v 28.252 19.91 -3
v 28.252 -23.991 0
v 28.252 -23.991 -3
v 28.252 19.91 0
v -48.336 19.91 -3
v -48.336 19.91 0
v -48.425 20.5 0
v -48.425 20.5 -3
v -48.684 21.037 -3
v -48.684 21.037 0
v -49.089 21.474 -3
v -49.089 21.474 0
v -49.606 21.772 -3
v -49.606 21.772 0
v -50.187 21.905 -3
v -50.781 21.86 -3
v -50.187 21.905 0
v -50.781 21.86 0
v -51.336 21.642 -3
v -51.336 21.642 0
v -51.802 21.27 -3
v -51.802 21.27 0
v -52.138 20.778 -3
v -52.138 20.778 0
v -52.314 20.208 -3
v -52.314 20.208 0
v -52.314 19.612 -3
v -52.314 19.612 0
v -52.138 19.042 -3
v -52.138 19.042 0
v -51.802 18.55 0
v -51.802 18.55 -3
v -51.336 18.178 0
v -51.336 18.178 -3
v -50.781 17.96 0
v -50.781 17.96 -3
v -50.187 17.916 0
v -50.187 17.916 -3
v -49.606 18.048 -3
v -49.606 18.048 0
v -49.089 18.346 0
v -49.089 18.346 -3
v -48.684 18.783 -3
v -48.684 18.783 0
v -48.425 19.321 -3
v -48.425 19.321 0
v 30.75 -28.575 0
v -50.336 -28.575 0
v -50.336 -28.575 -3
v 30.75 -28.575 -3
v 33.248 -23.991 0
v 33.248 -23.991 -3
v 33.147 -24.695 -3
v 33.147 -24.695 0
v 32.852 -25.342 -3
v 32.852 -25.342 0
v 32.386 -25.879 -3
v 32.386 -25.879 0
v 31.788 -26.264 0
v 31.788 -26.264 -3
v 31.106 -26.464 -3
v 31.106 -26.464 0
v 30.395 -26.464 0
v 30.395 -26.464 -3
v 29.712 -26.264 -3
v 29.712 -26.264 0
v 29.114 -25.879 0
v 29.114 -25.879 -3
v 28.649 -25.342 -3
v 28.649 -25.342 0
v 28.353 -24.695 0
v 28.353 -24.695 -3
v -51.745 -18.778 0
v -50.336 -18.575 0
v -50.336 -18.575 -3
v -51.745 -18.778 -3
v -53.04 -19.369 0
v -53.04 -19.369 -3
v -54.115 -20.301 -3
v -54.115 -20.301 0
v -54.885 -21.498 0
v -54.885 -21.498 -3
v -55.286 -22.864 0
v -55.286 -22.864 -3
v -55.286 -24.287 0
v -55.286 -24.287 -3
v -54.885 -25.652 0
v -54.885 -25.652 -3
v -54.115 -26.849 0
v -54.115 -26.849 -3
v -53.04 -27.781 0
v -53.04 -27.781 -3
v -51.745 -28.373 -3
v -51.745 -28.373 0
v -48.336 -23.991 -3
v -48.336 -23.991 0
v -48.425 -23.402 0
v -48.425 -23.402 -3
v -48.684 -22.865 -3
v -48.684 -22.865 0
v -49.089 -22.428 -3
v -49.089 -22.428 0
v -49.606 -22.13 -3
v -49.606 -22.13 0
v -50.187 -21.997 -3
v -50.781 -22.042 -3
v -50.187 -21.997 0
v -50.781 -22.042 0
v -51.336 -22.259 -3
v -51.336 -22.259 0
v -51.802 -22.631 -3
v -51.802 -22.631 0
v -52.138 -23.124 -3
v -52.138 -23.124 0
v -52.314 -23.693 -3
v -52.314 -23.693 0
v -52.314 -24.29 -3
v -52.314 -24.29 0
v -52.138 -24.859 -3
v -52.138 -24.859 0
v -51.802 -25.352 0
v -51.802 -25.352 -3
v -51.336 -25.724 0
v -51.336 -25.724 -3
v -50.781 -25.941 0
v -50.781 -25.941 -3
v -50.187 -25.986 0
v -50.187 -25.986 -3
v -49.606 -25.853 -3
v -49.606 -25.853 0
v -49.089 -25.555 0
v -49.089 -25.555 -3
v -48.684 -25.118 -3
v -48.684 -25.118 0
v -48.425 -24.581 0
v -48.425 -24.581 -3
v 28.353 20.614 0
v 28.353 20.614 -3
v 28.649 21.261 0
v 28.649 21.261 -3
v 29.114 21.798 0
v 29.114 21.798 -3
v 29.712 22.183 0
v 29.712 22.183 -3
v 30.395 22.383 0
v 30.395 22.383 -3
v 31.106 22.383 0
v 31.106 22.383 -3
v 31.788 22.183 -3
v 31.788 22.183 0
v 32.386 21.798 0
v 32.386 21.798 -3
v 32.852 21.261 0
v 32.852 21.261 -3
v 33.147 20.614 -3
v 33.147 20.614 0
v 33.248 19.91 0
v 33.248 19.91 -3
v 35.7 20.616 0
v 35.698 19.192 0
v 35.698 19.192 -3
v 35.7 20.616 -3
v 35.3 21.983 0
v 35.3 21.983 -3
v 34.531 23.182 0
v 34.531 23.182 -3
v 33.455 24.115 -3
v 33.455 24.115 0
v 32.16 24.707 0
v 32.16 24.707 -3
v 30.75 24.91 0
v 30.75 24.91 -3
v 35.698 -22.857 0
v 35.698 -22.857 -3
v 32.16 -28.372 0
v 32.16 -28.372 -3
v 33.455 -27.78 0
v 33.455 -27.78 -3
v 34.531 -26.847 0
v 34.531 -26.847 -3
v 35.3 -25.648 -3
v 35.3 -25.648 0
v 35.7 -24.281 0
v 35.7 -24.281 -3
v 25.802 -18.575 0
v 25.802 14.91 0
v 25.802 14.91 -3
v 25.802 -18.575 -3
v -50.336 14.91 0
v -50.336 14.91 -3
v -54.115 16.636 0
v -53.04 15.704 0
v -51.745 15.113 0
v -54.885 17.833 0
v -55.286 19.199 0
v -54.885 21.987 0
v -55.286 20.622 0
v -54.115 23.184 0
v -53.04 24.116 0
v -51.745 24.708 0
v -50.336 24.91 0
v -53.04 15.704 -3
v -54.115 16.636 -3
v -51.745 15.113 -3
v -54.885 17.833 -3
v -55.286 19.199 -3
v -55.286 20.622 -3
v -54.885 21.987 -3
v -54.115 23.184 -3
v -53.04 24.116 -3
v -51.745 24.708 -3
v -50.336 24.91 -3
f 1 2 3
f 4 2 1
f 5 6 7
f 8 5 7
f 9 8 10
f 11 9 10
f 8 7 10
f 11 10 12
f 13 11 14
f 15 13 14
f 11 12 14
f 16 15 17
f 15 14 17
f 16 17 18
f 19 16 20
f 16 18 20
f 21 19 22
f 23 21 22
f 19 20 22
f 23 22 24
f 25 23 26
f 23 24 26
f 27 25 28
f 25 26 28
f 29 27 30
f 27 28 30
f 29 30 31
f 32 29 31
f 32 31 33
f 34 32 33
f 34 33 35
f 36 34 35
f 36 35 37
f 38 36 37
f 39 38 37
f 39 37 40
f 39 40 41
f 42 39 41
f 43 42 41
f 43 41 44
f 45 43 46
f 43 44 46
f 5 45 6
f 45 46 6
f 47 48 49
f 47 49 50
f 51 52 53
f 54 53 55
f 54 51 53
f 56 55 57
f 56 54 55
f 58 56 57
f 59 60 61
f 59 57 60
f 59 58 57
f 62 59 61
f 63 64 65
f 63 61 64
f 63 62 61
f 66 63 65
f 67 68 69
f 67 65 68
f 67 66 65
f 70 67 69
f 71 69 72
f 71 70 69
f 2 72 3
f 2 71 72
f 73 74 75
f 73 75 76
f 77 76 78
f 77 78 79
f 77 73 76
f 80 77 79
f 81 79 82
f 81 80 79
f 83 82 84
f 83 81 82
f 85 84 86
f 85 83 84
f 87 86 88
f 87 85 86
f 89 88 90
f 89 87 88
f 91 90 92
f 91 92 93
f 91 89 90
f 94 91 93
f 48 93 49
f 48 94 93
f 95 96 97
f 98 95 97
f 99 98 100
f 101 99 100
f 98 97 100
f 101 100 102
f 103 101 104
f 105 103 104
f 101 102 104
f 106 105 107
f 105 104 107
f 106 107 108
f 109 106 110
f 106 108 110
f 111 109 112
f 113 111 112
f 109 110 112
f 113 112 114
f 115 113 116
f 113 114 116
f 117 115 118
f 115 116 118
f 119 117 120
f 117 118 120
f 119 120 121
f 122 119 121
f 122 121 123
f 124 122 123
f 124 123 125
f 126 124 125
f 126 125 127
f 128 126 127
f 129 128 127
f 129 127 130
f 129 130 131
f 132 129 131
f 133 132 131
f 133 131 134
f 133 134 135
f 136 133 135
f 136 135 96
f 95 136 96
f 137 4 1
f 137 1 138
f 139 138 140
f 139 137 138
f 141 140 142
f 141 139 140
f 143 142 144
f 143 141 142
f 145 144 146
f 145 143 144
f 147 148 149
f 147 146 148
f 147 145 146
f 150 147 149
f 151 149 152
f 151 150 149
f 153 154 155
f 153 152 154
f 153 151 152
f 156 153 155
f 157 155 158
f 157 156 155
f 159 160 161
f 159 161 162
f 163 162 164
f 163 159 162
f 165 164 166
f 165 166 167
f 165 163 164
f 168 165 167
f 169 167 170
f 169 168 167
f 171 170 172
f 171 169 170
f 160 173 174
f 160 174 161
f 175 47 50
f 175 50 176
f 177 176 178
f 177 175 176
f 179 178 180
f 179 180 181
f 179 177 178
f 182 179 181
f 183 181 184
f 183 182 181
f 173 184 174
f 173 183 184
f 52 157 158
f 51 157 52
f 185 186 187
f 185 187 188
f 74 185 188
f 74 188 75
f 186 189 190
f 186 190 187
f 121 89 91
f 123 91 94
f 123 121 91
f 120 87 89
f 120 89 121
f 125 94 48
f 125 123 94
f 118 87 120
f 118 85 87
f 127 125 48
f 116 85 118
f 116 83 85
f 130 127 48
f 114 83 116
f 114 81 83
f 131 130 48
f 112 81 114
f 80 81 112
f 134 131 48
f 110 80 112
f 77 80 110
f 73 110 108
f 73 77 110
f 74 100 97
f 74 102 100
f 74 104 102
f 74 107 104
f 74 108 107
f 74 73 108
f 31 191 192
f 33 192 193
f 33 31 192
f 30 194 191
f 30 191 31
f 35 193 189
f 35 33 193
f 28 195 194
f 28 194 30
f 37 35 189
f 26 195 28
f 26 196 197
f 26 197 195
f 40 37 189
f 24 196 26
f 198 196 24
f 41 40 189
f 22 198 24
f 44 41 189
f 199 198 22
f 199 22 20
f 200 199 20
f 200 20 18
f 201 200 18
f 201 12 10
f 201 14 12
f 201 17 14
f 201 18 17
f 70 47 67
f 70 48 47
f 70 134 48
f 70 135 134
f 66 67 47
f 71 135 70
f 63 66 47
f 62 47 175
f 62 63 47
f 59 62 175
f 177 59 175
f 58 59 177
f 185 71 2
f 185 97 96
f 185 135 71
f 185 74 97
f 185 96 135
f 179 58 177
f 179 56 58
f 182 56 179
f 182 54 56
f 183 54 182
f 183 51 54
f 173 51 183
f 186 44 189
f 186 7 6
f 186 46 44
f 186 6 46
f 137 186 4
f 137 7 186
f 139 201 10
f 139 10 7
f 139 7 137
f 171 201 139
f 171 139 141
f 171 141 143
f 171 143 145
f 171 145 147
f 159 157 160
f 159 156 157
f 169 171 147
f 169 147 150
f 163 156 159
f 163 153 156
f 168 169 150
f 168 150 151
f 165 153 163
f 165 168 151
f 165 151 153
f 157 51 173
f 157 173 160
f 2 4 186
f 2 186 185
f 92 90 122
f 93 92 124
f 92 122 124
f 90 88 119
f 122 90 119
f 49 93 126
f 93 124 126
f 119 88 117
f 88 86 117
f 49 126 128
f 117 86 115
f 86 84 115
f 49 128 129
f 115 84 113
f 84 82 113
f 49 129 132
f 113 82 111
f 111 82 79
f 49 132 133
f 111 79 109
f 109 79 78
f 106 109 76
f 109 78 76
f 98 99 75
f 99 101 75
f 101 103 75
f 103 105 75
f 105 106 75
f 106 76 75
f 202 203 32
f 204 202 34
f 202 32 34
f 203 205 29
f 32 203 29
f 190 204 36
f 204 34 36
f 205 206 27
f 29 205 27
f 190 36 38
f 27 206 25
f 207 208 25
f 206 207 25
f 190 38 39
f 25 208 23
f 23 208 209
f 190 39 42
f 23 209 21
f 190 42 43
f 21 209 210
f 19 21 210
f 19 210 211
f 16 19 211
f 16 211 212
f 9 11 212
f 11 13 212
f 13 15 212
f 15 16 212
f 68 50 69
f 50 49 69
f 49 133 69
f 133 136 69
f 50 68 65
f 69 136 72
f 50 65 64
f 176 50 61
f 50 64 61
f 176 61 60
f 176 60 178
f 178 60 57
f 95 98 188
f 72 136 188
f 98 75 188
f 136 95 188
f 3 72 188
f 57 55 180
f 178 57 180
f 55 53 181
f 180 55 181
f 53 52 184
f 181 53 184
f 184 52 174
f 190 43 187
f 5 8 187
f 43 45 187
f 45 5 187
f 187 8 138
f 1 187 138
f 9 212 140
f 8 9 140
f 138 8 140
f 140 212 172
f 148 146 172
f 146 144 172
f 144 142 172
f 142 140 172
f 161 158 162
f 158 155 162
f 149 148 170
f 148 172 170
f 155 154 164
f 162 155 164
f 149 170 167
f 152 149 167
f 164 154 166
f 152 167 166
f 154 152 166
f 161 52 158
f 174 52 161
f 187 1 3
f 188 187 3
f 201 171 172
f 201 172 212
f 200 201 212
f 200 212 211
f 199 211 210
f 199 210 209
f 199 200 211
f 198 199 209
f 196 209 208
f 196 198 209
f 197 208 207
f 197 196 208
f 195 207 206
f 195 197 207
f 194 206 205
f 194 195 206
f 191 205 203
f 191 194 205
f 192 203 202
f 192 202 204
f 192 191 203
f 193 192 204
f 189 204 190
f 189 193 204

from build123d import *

# Parameters (mm, degrees)
SKETCH_1_R          = 2
EXTRUDE_1_DEPTH     = 3
SKETCH_6_R          = 2
CUT_EXTRUDE_1_DEPTH = 6
CUT_EXTRUDE_2_DEPTH = 6


with BuildPart() as part:
    # 草图1 → 凸台-拉伸1 (new body)
    with BuildSketch(Plane.XY):
        with BuildLine():
            Line((30.750249224, 24.910133645), (-50.336395226, 24.910133645))
            ThreePointArc((-50.336395226, 24.910133645), (-55.336395226, 19.910133645), (-50.336395226, 14.910133645))
            Line((-50.336395226, 14.910133645), (25.802071198, 14.910133645))
            Line((25.802071198, 14.910133645), (25.802071198, -18.575080464))
            Line((25.802071198, -18.575080464), (-50.336395226, -18.575080464))
            ThreePointArc((-50.336395226, -18.575080464), (-55.336395226, -23.575080464), (-50.336395226, -28.575080464))
            Line((-50.336395226, -28.575080464), (30.750249224, -28.575080464))
            ThreePointArc((30.750249224, -28.575080464), (34.531124493, -26.846927374), (35.69842725, -22.857073344))
            Line((35.69842725, -22.857073344), (35.69842725, 19.192126526))
            ThreePointArc((35.69842725, 19.192126526), (34.531124493, 23.181980555), (30.750249224, 24.910133645))
        make_face()
        with Locations((-50.336395226, 19.910133645)):
            Circle(SKETCH_1_R, mode=Mode.SUBTRACT)
    extrude(amount=-EXTRUDE_1_DEPTH)

    # 草图6 → 切除-拉伸1 (cut)
    with BuildSketch(Plane.XY):
        with Locations((-50.336395226, -23.991463112)):
            Circle(SKETCH_6_R)
    extrude(amount=-CUT_EXTRUDE_1_DEPTH, mode=Mode.SUBTRACT)

    # 草图13 → 切除-拉伸2 (cut)
    with BuildSketch(Plane.XY):
        with BuildLine():
            Line((33.24842725, 19.910133645), (33.24842725, -23.991463112))
            ThreePointArc((33.24842725, -23.991463112), (30.750249224, -26.489641138), (28.252071198, -23.991463112))
            Line((28.252071198, -23.991463112), (28.252071198, 19.910133645))
            ThreePointArc((28.252071198, 19.910133645), (30.750249224, 22.408311671), (33.24842725, 19.910133645))
        make_face()
    extrude(amount=-CUT_EXTRUDE_2_DEPTH, mode=Mode.SUBTRACT)


solid = part.part
